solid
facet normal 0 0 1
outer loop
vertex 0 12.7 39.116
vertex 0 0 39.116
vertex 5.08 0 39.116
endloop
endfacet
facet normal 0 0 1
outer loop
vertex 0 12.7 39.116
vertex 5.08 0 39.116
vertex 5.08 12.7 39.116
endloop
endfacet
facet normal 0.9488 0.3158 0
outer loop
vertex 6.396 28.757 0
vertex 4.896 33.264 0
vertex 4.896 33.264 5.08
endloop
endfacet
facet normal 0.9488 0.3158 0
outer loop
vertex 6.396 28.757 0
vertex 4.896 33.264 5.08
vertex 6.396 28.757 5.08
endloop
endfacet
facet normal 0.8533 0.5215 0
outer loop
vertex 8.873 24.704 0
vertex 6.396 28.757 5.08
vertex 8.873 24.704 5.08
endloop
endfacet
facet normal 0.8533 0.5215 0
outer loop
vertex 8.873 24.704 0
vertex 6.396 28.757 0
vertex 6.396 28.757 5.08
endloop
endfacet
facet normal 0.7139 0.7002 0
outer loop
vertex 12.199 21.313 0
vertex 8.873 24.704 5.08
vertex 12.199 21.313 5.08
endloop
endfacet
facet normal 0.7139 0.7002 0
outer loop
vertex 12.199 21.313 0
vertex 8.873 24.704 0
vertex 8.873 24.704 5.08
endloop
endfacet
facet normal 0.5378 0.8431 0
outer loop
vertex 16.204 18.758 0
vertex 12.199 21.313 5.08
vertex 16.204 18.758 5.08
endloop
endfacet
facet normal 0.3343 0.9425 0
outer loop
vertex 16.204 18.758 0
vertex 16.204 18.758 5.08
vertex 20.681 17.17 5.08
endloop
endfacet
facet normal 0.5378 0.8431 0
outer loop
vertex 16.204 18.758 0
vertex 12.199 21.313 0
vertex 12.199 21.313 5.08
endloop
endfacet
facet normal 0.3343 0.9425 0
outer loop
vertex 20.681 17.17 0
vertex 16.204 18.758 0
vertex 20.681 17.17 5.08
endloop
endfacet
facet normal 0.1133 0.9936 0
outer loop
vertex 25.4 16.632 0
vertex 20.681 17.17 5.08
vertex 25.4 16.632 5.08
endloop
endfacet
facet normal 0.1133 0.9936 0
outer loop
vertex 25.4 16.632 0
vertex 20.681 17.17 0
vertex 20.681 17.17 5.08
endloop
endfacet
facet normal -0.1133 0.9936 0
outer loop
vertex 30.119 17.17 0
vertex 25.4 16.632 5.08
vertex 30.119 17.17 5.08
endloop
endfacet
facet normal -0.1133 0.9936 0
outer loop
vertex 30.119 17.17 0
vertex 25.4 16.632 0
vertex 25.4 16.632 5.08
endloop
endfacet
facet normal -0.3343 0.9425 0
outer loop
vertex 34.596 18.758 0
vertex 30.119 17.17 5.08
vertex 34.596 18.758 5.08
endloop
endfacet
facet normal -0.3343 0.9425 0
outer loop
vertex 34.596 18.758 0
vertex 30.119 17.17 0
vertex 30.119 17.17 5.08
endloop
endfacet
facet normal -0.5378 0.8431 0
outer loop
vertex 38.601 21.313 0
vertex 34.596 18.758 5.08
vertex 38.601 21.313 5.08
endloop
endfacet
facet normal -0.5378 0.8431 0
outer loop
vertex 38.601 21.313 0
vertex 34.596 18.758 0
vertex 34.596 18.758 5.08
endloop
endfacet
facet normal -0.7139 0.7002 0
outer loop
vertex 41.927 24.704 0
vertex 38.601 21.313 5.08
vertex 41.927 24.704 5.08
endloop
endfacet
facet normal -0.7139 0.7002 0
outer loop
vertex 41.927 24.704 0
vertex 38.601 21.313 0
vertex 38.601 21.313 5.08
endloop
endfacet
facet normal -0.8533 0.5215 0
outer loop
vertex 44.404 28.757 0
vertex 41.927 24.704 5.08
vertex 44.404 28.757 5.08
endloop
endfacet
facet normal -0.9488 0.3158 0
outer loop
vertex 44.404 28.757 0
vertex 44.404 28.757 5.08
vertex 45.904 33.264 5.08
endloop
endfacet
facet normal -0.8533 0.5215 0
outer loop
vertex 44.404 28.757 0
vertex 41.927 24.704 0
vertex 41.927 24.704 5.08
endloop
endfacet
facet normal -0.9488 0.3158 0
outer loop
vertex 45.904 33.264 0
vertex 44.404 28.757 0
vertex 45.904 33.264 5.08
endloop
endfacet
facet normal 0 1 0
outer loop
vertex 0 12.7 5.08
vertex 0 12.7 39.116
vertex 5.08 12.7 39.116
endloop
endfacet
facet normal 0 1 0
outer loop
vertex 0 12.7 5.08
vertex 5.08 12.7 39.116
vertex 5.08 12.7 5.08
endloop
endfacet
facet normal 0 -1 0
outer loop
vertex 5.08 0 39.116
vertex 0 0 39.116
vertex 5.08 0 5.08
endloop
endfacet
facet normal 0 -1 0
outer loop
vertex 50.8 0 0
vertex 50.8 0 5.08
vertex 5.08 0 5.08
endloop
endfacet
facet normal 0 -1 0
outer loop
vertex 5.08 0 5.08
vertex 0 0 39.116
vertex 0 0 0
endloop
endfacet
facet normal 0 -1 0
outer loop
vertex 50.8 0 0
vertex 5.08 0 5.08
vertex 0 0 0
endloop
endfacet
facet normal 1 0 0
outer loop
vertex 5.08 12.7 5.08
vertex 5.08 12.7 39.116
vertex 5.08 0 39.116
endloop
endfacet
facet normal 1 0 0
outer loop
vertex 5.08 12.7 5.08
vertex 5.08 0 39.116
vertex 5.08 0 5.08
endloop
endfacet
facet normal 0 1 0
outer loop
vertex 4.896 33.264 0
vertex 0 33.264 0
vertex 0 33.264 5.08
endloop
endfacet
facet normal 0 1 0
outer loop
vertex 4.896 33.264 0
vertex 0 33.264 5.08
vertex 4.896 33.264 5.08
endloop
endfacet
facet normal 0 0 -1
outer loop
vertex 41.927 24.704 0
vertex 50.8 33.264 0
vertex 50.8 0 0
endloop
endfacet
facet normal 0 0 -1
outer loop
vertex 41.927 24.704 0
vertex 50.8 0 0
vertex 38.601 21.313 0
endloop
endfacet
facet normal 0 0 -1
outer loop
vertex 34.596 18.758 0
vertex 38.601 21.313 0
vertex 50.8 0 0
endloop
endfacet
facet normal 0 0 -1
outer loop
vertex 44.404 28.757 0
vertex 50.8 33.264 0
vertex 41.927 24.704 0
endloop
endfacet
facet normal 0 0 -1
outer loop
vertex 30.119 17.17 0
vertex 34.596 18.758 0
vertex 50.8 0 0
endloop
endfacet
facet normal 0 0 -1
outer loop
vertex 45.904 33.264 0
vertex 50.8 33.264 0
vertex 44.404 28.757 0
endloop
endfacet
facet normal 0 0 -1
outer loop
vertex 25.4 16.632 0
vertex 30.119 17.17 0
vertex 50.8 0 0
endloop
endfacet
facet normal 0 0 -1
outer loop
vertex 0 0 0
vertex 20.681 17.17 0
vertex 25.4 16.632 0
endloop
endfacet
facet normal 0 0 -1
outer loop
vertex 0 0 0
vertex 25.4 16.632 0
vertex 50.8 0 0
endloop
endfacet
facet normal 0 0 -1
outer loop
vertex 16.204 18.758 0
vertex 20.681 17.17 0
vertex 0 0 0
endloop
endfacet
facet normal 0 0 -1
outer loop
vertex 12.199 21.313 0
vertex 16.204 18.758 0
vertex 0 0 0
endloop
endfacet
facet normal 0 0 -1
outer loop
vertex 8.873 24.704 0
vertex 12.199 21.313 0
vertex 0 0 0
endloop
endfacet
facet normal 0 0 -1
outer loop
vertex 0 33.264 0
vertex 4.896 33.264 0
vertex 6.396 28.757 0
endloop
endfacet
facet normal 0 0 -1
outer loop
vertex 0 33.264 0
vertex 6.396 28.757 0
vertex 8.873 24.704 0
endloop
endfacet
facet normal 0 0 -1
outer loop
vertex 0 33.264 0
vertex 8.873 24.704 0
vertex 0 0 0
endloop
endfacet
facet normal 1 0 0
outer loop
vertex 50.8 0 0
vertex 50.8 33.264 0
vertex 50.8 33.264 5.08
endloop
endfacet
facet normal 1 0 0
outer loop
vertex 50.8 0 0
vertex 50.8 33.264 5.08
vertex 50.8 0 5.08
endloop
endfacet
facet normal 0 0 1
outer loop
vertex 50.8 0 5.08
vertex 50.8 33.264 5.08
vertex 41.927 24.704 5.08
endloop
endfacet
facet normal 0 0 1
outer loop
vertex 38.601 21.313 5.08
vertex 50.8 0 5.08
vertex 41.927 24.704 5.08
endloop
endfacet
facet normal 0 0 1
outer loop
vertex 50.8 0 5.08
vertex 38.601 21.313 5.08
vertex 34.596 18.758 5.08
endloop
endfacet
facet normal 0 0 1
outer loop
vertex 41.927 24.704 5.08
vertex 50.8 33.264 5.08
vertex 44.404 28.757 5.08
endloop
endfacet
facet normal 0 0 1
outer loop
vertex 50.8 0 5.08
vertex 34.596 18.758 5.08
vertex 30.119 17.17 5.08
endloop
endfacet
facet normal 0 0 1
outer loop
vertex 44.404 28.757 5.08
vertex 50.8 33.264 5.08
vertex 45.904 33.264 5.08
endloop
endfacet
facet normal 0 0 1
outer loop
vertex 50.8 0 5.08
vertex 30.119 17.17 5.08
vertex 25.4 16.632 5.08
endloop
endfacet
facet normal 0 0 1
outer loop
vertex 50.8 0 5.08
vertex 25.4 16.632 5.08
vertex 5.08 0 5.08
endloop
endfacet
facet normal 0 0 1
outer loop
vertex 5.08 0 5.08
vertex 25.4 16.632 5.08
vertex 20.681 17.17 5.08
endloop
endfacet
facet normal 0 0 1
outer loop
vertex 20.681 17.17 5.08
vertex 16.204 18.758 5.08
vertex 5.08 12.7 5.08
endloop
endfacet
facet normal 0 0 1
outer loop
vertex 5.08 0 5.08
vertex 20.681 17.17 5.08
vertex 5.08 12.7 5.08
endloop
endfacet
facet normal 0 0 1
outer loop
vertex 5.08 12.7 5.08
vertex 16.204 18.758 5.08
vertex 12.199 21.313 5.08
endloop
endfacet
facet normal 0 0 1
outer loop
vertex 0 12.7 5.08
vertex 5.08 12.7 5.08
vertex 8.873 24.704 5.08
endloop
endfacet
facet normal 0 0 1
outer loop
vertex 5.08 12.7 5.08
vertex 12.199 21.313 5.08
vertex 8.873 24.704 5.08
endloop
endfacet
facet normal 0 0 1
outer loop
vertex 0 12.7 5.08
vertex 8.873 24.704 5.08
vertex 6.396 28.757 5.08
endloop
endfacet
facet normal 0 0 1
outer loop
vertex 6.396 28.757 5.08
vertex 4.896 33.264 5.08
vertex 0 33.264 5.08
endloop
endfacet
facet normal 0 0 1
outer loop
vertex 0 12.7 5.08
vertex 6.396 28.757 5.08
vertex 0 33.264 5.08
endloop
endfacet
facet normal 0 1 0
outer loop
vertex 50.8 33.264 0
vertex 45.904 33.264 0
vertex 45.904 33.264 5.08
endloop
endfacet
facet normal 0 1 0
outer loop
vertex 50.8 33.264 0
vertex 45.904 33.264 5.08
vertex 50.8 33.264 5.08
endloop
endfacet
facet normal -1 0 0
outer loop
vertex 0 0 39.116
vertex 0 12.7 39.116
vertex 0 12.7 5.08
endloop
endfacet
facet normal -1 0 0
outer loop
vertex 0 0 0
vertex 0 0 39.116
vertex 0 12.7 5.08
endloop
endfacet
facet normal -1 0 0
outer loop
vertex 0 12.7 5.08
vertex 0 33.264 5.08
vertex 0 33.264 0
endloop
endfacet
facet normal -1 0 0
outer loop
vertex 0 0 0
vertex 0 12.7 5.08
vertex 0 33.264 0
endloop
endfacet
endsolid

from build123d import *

# Parameters (mm, degrees)
BOSS_EXTRUDE1_DEPTH = 5.08
SKETCH2_W           = 34.036
SKETCH2_H           = 12.7
BOSS_EXTRUDE2_DEPTH = 5.08


with BuildPart() as part:
    # Sketch1 → Boss-Extrude1 (new body)
    with BuildSketch(Plane.XY):
        with BuildLine():
            ThreePointArc((4.89576896, 33.263952472), (25.4, 16.631976236), (45.90423104, 33.263952472))
            Line((45.90423104, 33.263952472), (50.8, 33.263952472))
            Line((50.8, 33.263952472), (50.8, 0))
            Line((50.8, 0), (0, 0))
            Line((0, 0), (0, 33.263952472))
            Line((0, 33.263952472), (4.89576896, 33.263952472))
        make_face()
    extrude(amount=BOSS_EXTRUDE1_DEPTH)

    # Sketch2 → Boss-Extrude2 (add)
    with BuildSketch(Plane(origin=(0, 0, 0), x_dir=(0, 0, -1), z_dir=(1, 0, 0))):
        with Locations((-22.098, 6.35)):
            Rectangle(SKETCH2_W, SKETCH2_H)
    extrude(amount=BOSS_EXTRUDE2_DEPTH)


solid = part.part
